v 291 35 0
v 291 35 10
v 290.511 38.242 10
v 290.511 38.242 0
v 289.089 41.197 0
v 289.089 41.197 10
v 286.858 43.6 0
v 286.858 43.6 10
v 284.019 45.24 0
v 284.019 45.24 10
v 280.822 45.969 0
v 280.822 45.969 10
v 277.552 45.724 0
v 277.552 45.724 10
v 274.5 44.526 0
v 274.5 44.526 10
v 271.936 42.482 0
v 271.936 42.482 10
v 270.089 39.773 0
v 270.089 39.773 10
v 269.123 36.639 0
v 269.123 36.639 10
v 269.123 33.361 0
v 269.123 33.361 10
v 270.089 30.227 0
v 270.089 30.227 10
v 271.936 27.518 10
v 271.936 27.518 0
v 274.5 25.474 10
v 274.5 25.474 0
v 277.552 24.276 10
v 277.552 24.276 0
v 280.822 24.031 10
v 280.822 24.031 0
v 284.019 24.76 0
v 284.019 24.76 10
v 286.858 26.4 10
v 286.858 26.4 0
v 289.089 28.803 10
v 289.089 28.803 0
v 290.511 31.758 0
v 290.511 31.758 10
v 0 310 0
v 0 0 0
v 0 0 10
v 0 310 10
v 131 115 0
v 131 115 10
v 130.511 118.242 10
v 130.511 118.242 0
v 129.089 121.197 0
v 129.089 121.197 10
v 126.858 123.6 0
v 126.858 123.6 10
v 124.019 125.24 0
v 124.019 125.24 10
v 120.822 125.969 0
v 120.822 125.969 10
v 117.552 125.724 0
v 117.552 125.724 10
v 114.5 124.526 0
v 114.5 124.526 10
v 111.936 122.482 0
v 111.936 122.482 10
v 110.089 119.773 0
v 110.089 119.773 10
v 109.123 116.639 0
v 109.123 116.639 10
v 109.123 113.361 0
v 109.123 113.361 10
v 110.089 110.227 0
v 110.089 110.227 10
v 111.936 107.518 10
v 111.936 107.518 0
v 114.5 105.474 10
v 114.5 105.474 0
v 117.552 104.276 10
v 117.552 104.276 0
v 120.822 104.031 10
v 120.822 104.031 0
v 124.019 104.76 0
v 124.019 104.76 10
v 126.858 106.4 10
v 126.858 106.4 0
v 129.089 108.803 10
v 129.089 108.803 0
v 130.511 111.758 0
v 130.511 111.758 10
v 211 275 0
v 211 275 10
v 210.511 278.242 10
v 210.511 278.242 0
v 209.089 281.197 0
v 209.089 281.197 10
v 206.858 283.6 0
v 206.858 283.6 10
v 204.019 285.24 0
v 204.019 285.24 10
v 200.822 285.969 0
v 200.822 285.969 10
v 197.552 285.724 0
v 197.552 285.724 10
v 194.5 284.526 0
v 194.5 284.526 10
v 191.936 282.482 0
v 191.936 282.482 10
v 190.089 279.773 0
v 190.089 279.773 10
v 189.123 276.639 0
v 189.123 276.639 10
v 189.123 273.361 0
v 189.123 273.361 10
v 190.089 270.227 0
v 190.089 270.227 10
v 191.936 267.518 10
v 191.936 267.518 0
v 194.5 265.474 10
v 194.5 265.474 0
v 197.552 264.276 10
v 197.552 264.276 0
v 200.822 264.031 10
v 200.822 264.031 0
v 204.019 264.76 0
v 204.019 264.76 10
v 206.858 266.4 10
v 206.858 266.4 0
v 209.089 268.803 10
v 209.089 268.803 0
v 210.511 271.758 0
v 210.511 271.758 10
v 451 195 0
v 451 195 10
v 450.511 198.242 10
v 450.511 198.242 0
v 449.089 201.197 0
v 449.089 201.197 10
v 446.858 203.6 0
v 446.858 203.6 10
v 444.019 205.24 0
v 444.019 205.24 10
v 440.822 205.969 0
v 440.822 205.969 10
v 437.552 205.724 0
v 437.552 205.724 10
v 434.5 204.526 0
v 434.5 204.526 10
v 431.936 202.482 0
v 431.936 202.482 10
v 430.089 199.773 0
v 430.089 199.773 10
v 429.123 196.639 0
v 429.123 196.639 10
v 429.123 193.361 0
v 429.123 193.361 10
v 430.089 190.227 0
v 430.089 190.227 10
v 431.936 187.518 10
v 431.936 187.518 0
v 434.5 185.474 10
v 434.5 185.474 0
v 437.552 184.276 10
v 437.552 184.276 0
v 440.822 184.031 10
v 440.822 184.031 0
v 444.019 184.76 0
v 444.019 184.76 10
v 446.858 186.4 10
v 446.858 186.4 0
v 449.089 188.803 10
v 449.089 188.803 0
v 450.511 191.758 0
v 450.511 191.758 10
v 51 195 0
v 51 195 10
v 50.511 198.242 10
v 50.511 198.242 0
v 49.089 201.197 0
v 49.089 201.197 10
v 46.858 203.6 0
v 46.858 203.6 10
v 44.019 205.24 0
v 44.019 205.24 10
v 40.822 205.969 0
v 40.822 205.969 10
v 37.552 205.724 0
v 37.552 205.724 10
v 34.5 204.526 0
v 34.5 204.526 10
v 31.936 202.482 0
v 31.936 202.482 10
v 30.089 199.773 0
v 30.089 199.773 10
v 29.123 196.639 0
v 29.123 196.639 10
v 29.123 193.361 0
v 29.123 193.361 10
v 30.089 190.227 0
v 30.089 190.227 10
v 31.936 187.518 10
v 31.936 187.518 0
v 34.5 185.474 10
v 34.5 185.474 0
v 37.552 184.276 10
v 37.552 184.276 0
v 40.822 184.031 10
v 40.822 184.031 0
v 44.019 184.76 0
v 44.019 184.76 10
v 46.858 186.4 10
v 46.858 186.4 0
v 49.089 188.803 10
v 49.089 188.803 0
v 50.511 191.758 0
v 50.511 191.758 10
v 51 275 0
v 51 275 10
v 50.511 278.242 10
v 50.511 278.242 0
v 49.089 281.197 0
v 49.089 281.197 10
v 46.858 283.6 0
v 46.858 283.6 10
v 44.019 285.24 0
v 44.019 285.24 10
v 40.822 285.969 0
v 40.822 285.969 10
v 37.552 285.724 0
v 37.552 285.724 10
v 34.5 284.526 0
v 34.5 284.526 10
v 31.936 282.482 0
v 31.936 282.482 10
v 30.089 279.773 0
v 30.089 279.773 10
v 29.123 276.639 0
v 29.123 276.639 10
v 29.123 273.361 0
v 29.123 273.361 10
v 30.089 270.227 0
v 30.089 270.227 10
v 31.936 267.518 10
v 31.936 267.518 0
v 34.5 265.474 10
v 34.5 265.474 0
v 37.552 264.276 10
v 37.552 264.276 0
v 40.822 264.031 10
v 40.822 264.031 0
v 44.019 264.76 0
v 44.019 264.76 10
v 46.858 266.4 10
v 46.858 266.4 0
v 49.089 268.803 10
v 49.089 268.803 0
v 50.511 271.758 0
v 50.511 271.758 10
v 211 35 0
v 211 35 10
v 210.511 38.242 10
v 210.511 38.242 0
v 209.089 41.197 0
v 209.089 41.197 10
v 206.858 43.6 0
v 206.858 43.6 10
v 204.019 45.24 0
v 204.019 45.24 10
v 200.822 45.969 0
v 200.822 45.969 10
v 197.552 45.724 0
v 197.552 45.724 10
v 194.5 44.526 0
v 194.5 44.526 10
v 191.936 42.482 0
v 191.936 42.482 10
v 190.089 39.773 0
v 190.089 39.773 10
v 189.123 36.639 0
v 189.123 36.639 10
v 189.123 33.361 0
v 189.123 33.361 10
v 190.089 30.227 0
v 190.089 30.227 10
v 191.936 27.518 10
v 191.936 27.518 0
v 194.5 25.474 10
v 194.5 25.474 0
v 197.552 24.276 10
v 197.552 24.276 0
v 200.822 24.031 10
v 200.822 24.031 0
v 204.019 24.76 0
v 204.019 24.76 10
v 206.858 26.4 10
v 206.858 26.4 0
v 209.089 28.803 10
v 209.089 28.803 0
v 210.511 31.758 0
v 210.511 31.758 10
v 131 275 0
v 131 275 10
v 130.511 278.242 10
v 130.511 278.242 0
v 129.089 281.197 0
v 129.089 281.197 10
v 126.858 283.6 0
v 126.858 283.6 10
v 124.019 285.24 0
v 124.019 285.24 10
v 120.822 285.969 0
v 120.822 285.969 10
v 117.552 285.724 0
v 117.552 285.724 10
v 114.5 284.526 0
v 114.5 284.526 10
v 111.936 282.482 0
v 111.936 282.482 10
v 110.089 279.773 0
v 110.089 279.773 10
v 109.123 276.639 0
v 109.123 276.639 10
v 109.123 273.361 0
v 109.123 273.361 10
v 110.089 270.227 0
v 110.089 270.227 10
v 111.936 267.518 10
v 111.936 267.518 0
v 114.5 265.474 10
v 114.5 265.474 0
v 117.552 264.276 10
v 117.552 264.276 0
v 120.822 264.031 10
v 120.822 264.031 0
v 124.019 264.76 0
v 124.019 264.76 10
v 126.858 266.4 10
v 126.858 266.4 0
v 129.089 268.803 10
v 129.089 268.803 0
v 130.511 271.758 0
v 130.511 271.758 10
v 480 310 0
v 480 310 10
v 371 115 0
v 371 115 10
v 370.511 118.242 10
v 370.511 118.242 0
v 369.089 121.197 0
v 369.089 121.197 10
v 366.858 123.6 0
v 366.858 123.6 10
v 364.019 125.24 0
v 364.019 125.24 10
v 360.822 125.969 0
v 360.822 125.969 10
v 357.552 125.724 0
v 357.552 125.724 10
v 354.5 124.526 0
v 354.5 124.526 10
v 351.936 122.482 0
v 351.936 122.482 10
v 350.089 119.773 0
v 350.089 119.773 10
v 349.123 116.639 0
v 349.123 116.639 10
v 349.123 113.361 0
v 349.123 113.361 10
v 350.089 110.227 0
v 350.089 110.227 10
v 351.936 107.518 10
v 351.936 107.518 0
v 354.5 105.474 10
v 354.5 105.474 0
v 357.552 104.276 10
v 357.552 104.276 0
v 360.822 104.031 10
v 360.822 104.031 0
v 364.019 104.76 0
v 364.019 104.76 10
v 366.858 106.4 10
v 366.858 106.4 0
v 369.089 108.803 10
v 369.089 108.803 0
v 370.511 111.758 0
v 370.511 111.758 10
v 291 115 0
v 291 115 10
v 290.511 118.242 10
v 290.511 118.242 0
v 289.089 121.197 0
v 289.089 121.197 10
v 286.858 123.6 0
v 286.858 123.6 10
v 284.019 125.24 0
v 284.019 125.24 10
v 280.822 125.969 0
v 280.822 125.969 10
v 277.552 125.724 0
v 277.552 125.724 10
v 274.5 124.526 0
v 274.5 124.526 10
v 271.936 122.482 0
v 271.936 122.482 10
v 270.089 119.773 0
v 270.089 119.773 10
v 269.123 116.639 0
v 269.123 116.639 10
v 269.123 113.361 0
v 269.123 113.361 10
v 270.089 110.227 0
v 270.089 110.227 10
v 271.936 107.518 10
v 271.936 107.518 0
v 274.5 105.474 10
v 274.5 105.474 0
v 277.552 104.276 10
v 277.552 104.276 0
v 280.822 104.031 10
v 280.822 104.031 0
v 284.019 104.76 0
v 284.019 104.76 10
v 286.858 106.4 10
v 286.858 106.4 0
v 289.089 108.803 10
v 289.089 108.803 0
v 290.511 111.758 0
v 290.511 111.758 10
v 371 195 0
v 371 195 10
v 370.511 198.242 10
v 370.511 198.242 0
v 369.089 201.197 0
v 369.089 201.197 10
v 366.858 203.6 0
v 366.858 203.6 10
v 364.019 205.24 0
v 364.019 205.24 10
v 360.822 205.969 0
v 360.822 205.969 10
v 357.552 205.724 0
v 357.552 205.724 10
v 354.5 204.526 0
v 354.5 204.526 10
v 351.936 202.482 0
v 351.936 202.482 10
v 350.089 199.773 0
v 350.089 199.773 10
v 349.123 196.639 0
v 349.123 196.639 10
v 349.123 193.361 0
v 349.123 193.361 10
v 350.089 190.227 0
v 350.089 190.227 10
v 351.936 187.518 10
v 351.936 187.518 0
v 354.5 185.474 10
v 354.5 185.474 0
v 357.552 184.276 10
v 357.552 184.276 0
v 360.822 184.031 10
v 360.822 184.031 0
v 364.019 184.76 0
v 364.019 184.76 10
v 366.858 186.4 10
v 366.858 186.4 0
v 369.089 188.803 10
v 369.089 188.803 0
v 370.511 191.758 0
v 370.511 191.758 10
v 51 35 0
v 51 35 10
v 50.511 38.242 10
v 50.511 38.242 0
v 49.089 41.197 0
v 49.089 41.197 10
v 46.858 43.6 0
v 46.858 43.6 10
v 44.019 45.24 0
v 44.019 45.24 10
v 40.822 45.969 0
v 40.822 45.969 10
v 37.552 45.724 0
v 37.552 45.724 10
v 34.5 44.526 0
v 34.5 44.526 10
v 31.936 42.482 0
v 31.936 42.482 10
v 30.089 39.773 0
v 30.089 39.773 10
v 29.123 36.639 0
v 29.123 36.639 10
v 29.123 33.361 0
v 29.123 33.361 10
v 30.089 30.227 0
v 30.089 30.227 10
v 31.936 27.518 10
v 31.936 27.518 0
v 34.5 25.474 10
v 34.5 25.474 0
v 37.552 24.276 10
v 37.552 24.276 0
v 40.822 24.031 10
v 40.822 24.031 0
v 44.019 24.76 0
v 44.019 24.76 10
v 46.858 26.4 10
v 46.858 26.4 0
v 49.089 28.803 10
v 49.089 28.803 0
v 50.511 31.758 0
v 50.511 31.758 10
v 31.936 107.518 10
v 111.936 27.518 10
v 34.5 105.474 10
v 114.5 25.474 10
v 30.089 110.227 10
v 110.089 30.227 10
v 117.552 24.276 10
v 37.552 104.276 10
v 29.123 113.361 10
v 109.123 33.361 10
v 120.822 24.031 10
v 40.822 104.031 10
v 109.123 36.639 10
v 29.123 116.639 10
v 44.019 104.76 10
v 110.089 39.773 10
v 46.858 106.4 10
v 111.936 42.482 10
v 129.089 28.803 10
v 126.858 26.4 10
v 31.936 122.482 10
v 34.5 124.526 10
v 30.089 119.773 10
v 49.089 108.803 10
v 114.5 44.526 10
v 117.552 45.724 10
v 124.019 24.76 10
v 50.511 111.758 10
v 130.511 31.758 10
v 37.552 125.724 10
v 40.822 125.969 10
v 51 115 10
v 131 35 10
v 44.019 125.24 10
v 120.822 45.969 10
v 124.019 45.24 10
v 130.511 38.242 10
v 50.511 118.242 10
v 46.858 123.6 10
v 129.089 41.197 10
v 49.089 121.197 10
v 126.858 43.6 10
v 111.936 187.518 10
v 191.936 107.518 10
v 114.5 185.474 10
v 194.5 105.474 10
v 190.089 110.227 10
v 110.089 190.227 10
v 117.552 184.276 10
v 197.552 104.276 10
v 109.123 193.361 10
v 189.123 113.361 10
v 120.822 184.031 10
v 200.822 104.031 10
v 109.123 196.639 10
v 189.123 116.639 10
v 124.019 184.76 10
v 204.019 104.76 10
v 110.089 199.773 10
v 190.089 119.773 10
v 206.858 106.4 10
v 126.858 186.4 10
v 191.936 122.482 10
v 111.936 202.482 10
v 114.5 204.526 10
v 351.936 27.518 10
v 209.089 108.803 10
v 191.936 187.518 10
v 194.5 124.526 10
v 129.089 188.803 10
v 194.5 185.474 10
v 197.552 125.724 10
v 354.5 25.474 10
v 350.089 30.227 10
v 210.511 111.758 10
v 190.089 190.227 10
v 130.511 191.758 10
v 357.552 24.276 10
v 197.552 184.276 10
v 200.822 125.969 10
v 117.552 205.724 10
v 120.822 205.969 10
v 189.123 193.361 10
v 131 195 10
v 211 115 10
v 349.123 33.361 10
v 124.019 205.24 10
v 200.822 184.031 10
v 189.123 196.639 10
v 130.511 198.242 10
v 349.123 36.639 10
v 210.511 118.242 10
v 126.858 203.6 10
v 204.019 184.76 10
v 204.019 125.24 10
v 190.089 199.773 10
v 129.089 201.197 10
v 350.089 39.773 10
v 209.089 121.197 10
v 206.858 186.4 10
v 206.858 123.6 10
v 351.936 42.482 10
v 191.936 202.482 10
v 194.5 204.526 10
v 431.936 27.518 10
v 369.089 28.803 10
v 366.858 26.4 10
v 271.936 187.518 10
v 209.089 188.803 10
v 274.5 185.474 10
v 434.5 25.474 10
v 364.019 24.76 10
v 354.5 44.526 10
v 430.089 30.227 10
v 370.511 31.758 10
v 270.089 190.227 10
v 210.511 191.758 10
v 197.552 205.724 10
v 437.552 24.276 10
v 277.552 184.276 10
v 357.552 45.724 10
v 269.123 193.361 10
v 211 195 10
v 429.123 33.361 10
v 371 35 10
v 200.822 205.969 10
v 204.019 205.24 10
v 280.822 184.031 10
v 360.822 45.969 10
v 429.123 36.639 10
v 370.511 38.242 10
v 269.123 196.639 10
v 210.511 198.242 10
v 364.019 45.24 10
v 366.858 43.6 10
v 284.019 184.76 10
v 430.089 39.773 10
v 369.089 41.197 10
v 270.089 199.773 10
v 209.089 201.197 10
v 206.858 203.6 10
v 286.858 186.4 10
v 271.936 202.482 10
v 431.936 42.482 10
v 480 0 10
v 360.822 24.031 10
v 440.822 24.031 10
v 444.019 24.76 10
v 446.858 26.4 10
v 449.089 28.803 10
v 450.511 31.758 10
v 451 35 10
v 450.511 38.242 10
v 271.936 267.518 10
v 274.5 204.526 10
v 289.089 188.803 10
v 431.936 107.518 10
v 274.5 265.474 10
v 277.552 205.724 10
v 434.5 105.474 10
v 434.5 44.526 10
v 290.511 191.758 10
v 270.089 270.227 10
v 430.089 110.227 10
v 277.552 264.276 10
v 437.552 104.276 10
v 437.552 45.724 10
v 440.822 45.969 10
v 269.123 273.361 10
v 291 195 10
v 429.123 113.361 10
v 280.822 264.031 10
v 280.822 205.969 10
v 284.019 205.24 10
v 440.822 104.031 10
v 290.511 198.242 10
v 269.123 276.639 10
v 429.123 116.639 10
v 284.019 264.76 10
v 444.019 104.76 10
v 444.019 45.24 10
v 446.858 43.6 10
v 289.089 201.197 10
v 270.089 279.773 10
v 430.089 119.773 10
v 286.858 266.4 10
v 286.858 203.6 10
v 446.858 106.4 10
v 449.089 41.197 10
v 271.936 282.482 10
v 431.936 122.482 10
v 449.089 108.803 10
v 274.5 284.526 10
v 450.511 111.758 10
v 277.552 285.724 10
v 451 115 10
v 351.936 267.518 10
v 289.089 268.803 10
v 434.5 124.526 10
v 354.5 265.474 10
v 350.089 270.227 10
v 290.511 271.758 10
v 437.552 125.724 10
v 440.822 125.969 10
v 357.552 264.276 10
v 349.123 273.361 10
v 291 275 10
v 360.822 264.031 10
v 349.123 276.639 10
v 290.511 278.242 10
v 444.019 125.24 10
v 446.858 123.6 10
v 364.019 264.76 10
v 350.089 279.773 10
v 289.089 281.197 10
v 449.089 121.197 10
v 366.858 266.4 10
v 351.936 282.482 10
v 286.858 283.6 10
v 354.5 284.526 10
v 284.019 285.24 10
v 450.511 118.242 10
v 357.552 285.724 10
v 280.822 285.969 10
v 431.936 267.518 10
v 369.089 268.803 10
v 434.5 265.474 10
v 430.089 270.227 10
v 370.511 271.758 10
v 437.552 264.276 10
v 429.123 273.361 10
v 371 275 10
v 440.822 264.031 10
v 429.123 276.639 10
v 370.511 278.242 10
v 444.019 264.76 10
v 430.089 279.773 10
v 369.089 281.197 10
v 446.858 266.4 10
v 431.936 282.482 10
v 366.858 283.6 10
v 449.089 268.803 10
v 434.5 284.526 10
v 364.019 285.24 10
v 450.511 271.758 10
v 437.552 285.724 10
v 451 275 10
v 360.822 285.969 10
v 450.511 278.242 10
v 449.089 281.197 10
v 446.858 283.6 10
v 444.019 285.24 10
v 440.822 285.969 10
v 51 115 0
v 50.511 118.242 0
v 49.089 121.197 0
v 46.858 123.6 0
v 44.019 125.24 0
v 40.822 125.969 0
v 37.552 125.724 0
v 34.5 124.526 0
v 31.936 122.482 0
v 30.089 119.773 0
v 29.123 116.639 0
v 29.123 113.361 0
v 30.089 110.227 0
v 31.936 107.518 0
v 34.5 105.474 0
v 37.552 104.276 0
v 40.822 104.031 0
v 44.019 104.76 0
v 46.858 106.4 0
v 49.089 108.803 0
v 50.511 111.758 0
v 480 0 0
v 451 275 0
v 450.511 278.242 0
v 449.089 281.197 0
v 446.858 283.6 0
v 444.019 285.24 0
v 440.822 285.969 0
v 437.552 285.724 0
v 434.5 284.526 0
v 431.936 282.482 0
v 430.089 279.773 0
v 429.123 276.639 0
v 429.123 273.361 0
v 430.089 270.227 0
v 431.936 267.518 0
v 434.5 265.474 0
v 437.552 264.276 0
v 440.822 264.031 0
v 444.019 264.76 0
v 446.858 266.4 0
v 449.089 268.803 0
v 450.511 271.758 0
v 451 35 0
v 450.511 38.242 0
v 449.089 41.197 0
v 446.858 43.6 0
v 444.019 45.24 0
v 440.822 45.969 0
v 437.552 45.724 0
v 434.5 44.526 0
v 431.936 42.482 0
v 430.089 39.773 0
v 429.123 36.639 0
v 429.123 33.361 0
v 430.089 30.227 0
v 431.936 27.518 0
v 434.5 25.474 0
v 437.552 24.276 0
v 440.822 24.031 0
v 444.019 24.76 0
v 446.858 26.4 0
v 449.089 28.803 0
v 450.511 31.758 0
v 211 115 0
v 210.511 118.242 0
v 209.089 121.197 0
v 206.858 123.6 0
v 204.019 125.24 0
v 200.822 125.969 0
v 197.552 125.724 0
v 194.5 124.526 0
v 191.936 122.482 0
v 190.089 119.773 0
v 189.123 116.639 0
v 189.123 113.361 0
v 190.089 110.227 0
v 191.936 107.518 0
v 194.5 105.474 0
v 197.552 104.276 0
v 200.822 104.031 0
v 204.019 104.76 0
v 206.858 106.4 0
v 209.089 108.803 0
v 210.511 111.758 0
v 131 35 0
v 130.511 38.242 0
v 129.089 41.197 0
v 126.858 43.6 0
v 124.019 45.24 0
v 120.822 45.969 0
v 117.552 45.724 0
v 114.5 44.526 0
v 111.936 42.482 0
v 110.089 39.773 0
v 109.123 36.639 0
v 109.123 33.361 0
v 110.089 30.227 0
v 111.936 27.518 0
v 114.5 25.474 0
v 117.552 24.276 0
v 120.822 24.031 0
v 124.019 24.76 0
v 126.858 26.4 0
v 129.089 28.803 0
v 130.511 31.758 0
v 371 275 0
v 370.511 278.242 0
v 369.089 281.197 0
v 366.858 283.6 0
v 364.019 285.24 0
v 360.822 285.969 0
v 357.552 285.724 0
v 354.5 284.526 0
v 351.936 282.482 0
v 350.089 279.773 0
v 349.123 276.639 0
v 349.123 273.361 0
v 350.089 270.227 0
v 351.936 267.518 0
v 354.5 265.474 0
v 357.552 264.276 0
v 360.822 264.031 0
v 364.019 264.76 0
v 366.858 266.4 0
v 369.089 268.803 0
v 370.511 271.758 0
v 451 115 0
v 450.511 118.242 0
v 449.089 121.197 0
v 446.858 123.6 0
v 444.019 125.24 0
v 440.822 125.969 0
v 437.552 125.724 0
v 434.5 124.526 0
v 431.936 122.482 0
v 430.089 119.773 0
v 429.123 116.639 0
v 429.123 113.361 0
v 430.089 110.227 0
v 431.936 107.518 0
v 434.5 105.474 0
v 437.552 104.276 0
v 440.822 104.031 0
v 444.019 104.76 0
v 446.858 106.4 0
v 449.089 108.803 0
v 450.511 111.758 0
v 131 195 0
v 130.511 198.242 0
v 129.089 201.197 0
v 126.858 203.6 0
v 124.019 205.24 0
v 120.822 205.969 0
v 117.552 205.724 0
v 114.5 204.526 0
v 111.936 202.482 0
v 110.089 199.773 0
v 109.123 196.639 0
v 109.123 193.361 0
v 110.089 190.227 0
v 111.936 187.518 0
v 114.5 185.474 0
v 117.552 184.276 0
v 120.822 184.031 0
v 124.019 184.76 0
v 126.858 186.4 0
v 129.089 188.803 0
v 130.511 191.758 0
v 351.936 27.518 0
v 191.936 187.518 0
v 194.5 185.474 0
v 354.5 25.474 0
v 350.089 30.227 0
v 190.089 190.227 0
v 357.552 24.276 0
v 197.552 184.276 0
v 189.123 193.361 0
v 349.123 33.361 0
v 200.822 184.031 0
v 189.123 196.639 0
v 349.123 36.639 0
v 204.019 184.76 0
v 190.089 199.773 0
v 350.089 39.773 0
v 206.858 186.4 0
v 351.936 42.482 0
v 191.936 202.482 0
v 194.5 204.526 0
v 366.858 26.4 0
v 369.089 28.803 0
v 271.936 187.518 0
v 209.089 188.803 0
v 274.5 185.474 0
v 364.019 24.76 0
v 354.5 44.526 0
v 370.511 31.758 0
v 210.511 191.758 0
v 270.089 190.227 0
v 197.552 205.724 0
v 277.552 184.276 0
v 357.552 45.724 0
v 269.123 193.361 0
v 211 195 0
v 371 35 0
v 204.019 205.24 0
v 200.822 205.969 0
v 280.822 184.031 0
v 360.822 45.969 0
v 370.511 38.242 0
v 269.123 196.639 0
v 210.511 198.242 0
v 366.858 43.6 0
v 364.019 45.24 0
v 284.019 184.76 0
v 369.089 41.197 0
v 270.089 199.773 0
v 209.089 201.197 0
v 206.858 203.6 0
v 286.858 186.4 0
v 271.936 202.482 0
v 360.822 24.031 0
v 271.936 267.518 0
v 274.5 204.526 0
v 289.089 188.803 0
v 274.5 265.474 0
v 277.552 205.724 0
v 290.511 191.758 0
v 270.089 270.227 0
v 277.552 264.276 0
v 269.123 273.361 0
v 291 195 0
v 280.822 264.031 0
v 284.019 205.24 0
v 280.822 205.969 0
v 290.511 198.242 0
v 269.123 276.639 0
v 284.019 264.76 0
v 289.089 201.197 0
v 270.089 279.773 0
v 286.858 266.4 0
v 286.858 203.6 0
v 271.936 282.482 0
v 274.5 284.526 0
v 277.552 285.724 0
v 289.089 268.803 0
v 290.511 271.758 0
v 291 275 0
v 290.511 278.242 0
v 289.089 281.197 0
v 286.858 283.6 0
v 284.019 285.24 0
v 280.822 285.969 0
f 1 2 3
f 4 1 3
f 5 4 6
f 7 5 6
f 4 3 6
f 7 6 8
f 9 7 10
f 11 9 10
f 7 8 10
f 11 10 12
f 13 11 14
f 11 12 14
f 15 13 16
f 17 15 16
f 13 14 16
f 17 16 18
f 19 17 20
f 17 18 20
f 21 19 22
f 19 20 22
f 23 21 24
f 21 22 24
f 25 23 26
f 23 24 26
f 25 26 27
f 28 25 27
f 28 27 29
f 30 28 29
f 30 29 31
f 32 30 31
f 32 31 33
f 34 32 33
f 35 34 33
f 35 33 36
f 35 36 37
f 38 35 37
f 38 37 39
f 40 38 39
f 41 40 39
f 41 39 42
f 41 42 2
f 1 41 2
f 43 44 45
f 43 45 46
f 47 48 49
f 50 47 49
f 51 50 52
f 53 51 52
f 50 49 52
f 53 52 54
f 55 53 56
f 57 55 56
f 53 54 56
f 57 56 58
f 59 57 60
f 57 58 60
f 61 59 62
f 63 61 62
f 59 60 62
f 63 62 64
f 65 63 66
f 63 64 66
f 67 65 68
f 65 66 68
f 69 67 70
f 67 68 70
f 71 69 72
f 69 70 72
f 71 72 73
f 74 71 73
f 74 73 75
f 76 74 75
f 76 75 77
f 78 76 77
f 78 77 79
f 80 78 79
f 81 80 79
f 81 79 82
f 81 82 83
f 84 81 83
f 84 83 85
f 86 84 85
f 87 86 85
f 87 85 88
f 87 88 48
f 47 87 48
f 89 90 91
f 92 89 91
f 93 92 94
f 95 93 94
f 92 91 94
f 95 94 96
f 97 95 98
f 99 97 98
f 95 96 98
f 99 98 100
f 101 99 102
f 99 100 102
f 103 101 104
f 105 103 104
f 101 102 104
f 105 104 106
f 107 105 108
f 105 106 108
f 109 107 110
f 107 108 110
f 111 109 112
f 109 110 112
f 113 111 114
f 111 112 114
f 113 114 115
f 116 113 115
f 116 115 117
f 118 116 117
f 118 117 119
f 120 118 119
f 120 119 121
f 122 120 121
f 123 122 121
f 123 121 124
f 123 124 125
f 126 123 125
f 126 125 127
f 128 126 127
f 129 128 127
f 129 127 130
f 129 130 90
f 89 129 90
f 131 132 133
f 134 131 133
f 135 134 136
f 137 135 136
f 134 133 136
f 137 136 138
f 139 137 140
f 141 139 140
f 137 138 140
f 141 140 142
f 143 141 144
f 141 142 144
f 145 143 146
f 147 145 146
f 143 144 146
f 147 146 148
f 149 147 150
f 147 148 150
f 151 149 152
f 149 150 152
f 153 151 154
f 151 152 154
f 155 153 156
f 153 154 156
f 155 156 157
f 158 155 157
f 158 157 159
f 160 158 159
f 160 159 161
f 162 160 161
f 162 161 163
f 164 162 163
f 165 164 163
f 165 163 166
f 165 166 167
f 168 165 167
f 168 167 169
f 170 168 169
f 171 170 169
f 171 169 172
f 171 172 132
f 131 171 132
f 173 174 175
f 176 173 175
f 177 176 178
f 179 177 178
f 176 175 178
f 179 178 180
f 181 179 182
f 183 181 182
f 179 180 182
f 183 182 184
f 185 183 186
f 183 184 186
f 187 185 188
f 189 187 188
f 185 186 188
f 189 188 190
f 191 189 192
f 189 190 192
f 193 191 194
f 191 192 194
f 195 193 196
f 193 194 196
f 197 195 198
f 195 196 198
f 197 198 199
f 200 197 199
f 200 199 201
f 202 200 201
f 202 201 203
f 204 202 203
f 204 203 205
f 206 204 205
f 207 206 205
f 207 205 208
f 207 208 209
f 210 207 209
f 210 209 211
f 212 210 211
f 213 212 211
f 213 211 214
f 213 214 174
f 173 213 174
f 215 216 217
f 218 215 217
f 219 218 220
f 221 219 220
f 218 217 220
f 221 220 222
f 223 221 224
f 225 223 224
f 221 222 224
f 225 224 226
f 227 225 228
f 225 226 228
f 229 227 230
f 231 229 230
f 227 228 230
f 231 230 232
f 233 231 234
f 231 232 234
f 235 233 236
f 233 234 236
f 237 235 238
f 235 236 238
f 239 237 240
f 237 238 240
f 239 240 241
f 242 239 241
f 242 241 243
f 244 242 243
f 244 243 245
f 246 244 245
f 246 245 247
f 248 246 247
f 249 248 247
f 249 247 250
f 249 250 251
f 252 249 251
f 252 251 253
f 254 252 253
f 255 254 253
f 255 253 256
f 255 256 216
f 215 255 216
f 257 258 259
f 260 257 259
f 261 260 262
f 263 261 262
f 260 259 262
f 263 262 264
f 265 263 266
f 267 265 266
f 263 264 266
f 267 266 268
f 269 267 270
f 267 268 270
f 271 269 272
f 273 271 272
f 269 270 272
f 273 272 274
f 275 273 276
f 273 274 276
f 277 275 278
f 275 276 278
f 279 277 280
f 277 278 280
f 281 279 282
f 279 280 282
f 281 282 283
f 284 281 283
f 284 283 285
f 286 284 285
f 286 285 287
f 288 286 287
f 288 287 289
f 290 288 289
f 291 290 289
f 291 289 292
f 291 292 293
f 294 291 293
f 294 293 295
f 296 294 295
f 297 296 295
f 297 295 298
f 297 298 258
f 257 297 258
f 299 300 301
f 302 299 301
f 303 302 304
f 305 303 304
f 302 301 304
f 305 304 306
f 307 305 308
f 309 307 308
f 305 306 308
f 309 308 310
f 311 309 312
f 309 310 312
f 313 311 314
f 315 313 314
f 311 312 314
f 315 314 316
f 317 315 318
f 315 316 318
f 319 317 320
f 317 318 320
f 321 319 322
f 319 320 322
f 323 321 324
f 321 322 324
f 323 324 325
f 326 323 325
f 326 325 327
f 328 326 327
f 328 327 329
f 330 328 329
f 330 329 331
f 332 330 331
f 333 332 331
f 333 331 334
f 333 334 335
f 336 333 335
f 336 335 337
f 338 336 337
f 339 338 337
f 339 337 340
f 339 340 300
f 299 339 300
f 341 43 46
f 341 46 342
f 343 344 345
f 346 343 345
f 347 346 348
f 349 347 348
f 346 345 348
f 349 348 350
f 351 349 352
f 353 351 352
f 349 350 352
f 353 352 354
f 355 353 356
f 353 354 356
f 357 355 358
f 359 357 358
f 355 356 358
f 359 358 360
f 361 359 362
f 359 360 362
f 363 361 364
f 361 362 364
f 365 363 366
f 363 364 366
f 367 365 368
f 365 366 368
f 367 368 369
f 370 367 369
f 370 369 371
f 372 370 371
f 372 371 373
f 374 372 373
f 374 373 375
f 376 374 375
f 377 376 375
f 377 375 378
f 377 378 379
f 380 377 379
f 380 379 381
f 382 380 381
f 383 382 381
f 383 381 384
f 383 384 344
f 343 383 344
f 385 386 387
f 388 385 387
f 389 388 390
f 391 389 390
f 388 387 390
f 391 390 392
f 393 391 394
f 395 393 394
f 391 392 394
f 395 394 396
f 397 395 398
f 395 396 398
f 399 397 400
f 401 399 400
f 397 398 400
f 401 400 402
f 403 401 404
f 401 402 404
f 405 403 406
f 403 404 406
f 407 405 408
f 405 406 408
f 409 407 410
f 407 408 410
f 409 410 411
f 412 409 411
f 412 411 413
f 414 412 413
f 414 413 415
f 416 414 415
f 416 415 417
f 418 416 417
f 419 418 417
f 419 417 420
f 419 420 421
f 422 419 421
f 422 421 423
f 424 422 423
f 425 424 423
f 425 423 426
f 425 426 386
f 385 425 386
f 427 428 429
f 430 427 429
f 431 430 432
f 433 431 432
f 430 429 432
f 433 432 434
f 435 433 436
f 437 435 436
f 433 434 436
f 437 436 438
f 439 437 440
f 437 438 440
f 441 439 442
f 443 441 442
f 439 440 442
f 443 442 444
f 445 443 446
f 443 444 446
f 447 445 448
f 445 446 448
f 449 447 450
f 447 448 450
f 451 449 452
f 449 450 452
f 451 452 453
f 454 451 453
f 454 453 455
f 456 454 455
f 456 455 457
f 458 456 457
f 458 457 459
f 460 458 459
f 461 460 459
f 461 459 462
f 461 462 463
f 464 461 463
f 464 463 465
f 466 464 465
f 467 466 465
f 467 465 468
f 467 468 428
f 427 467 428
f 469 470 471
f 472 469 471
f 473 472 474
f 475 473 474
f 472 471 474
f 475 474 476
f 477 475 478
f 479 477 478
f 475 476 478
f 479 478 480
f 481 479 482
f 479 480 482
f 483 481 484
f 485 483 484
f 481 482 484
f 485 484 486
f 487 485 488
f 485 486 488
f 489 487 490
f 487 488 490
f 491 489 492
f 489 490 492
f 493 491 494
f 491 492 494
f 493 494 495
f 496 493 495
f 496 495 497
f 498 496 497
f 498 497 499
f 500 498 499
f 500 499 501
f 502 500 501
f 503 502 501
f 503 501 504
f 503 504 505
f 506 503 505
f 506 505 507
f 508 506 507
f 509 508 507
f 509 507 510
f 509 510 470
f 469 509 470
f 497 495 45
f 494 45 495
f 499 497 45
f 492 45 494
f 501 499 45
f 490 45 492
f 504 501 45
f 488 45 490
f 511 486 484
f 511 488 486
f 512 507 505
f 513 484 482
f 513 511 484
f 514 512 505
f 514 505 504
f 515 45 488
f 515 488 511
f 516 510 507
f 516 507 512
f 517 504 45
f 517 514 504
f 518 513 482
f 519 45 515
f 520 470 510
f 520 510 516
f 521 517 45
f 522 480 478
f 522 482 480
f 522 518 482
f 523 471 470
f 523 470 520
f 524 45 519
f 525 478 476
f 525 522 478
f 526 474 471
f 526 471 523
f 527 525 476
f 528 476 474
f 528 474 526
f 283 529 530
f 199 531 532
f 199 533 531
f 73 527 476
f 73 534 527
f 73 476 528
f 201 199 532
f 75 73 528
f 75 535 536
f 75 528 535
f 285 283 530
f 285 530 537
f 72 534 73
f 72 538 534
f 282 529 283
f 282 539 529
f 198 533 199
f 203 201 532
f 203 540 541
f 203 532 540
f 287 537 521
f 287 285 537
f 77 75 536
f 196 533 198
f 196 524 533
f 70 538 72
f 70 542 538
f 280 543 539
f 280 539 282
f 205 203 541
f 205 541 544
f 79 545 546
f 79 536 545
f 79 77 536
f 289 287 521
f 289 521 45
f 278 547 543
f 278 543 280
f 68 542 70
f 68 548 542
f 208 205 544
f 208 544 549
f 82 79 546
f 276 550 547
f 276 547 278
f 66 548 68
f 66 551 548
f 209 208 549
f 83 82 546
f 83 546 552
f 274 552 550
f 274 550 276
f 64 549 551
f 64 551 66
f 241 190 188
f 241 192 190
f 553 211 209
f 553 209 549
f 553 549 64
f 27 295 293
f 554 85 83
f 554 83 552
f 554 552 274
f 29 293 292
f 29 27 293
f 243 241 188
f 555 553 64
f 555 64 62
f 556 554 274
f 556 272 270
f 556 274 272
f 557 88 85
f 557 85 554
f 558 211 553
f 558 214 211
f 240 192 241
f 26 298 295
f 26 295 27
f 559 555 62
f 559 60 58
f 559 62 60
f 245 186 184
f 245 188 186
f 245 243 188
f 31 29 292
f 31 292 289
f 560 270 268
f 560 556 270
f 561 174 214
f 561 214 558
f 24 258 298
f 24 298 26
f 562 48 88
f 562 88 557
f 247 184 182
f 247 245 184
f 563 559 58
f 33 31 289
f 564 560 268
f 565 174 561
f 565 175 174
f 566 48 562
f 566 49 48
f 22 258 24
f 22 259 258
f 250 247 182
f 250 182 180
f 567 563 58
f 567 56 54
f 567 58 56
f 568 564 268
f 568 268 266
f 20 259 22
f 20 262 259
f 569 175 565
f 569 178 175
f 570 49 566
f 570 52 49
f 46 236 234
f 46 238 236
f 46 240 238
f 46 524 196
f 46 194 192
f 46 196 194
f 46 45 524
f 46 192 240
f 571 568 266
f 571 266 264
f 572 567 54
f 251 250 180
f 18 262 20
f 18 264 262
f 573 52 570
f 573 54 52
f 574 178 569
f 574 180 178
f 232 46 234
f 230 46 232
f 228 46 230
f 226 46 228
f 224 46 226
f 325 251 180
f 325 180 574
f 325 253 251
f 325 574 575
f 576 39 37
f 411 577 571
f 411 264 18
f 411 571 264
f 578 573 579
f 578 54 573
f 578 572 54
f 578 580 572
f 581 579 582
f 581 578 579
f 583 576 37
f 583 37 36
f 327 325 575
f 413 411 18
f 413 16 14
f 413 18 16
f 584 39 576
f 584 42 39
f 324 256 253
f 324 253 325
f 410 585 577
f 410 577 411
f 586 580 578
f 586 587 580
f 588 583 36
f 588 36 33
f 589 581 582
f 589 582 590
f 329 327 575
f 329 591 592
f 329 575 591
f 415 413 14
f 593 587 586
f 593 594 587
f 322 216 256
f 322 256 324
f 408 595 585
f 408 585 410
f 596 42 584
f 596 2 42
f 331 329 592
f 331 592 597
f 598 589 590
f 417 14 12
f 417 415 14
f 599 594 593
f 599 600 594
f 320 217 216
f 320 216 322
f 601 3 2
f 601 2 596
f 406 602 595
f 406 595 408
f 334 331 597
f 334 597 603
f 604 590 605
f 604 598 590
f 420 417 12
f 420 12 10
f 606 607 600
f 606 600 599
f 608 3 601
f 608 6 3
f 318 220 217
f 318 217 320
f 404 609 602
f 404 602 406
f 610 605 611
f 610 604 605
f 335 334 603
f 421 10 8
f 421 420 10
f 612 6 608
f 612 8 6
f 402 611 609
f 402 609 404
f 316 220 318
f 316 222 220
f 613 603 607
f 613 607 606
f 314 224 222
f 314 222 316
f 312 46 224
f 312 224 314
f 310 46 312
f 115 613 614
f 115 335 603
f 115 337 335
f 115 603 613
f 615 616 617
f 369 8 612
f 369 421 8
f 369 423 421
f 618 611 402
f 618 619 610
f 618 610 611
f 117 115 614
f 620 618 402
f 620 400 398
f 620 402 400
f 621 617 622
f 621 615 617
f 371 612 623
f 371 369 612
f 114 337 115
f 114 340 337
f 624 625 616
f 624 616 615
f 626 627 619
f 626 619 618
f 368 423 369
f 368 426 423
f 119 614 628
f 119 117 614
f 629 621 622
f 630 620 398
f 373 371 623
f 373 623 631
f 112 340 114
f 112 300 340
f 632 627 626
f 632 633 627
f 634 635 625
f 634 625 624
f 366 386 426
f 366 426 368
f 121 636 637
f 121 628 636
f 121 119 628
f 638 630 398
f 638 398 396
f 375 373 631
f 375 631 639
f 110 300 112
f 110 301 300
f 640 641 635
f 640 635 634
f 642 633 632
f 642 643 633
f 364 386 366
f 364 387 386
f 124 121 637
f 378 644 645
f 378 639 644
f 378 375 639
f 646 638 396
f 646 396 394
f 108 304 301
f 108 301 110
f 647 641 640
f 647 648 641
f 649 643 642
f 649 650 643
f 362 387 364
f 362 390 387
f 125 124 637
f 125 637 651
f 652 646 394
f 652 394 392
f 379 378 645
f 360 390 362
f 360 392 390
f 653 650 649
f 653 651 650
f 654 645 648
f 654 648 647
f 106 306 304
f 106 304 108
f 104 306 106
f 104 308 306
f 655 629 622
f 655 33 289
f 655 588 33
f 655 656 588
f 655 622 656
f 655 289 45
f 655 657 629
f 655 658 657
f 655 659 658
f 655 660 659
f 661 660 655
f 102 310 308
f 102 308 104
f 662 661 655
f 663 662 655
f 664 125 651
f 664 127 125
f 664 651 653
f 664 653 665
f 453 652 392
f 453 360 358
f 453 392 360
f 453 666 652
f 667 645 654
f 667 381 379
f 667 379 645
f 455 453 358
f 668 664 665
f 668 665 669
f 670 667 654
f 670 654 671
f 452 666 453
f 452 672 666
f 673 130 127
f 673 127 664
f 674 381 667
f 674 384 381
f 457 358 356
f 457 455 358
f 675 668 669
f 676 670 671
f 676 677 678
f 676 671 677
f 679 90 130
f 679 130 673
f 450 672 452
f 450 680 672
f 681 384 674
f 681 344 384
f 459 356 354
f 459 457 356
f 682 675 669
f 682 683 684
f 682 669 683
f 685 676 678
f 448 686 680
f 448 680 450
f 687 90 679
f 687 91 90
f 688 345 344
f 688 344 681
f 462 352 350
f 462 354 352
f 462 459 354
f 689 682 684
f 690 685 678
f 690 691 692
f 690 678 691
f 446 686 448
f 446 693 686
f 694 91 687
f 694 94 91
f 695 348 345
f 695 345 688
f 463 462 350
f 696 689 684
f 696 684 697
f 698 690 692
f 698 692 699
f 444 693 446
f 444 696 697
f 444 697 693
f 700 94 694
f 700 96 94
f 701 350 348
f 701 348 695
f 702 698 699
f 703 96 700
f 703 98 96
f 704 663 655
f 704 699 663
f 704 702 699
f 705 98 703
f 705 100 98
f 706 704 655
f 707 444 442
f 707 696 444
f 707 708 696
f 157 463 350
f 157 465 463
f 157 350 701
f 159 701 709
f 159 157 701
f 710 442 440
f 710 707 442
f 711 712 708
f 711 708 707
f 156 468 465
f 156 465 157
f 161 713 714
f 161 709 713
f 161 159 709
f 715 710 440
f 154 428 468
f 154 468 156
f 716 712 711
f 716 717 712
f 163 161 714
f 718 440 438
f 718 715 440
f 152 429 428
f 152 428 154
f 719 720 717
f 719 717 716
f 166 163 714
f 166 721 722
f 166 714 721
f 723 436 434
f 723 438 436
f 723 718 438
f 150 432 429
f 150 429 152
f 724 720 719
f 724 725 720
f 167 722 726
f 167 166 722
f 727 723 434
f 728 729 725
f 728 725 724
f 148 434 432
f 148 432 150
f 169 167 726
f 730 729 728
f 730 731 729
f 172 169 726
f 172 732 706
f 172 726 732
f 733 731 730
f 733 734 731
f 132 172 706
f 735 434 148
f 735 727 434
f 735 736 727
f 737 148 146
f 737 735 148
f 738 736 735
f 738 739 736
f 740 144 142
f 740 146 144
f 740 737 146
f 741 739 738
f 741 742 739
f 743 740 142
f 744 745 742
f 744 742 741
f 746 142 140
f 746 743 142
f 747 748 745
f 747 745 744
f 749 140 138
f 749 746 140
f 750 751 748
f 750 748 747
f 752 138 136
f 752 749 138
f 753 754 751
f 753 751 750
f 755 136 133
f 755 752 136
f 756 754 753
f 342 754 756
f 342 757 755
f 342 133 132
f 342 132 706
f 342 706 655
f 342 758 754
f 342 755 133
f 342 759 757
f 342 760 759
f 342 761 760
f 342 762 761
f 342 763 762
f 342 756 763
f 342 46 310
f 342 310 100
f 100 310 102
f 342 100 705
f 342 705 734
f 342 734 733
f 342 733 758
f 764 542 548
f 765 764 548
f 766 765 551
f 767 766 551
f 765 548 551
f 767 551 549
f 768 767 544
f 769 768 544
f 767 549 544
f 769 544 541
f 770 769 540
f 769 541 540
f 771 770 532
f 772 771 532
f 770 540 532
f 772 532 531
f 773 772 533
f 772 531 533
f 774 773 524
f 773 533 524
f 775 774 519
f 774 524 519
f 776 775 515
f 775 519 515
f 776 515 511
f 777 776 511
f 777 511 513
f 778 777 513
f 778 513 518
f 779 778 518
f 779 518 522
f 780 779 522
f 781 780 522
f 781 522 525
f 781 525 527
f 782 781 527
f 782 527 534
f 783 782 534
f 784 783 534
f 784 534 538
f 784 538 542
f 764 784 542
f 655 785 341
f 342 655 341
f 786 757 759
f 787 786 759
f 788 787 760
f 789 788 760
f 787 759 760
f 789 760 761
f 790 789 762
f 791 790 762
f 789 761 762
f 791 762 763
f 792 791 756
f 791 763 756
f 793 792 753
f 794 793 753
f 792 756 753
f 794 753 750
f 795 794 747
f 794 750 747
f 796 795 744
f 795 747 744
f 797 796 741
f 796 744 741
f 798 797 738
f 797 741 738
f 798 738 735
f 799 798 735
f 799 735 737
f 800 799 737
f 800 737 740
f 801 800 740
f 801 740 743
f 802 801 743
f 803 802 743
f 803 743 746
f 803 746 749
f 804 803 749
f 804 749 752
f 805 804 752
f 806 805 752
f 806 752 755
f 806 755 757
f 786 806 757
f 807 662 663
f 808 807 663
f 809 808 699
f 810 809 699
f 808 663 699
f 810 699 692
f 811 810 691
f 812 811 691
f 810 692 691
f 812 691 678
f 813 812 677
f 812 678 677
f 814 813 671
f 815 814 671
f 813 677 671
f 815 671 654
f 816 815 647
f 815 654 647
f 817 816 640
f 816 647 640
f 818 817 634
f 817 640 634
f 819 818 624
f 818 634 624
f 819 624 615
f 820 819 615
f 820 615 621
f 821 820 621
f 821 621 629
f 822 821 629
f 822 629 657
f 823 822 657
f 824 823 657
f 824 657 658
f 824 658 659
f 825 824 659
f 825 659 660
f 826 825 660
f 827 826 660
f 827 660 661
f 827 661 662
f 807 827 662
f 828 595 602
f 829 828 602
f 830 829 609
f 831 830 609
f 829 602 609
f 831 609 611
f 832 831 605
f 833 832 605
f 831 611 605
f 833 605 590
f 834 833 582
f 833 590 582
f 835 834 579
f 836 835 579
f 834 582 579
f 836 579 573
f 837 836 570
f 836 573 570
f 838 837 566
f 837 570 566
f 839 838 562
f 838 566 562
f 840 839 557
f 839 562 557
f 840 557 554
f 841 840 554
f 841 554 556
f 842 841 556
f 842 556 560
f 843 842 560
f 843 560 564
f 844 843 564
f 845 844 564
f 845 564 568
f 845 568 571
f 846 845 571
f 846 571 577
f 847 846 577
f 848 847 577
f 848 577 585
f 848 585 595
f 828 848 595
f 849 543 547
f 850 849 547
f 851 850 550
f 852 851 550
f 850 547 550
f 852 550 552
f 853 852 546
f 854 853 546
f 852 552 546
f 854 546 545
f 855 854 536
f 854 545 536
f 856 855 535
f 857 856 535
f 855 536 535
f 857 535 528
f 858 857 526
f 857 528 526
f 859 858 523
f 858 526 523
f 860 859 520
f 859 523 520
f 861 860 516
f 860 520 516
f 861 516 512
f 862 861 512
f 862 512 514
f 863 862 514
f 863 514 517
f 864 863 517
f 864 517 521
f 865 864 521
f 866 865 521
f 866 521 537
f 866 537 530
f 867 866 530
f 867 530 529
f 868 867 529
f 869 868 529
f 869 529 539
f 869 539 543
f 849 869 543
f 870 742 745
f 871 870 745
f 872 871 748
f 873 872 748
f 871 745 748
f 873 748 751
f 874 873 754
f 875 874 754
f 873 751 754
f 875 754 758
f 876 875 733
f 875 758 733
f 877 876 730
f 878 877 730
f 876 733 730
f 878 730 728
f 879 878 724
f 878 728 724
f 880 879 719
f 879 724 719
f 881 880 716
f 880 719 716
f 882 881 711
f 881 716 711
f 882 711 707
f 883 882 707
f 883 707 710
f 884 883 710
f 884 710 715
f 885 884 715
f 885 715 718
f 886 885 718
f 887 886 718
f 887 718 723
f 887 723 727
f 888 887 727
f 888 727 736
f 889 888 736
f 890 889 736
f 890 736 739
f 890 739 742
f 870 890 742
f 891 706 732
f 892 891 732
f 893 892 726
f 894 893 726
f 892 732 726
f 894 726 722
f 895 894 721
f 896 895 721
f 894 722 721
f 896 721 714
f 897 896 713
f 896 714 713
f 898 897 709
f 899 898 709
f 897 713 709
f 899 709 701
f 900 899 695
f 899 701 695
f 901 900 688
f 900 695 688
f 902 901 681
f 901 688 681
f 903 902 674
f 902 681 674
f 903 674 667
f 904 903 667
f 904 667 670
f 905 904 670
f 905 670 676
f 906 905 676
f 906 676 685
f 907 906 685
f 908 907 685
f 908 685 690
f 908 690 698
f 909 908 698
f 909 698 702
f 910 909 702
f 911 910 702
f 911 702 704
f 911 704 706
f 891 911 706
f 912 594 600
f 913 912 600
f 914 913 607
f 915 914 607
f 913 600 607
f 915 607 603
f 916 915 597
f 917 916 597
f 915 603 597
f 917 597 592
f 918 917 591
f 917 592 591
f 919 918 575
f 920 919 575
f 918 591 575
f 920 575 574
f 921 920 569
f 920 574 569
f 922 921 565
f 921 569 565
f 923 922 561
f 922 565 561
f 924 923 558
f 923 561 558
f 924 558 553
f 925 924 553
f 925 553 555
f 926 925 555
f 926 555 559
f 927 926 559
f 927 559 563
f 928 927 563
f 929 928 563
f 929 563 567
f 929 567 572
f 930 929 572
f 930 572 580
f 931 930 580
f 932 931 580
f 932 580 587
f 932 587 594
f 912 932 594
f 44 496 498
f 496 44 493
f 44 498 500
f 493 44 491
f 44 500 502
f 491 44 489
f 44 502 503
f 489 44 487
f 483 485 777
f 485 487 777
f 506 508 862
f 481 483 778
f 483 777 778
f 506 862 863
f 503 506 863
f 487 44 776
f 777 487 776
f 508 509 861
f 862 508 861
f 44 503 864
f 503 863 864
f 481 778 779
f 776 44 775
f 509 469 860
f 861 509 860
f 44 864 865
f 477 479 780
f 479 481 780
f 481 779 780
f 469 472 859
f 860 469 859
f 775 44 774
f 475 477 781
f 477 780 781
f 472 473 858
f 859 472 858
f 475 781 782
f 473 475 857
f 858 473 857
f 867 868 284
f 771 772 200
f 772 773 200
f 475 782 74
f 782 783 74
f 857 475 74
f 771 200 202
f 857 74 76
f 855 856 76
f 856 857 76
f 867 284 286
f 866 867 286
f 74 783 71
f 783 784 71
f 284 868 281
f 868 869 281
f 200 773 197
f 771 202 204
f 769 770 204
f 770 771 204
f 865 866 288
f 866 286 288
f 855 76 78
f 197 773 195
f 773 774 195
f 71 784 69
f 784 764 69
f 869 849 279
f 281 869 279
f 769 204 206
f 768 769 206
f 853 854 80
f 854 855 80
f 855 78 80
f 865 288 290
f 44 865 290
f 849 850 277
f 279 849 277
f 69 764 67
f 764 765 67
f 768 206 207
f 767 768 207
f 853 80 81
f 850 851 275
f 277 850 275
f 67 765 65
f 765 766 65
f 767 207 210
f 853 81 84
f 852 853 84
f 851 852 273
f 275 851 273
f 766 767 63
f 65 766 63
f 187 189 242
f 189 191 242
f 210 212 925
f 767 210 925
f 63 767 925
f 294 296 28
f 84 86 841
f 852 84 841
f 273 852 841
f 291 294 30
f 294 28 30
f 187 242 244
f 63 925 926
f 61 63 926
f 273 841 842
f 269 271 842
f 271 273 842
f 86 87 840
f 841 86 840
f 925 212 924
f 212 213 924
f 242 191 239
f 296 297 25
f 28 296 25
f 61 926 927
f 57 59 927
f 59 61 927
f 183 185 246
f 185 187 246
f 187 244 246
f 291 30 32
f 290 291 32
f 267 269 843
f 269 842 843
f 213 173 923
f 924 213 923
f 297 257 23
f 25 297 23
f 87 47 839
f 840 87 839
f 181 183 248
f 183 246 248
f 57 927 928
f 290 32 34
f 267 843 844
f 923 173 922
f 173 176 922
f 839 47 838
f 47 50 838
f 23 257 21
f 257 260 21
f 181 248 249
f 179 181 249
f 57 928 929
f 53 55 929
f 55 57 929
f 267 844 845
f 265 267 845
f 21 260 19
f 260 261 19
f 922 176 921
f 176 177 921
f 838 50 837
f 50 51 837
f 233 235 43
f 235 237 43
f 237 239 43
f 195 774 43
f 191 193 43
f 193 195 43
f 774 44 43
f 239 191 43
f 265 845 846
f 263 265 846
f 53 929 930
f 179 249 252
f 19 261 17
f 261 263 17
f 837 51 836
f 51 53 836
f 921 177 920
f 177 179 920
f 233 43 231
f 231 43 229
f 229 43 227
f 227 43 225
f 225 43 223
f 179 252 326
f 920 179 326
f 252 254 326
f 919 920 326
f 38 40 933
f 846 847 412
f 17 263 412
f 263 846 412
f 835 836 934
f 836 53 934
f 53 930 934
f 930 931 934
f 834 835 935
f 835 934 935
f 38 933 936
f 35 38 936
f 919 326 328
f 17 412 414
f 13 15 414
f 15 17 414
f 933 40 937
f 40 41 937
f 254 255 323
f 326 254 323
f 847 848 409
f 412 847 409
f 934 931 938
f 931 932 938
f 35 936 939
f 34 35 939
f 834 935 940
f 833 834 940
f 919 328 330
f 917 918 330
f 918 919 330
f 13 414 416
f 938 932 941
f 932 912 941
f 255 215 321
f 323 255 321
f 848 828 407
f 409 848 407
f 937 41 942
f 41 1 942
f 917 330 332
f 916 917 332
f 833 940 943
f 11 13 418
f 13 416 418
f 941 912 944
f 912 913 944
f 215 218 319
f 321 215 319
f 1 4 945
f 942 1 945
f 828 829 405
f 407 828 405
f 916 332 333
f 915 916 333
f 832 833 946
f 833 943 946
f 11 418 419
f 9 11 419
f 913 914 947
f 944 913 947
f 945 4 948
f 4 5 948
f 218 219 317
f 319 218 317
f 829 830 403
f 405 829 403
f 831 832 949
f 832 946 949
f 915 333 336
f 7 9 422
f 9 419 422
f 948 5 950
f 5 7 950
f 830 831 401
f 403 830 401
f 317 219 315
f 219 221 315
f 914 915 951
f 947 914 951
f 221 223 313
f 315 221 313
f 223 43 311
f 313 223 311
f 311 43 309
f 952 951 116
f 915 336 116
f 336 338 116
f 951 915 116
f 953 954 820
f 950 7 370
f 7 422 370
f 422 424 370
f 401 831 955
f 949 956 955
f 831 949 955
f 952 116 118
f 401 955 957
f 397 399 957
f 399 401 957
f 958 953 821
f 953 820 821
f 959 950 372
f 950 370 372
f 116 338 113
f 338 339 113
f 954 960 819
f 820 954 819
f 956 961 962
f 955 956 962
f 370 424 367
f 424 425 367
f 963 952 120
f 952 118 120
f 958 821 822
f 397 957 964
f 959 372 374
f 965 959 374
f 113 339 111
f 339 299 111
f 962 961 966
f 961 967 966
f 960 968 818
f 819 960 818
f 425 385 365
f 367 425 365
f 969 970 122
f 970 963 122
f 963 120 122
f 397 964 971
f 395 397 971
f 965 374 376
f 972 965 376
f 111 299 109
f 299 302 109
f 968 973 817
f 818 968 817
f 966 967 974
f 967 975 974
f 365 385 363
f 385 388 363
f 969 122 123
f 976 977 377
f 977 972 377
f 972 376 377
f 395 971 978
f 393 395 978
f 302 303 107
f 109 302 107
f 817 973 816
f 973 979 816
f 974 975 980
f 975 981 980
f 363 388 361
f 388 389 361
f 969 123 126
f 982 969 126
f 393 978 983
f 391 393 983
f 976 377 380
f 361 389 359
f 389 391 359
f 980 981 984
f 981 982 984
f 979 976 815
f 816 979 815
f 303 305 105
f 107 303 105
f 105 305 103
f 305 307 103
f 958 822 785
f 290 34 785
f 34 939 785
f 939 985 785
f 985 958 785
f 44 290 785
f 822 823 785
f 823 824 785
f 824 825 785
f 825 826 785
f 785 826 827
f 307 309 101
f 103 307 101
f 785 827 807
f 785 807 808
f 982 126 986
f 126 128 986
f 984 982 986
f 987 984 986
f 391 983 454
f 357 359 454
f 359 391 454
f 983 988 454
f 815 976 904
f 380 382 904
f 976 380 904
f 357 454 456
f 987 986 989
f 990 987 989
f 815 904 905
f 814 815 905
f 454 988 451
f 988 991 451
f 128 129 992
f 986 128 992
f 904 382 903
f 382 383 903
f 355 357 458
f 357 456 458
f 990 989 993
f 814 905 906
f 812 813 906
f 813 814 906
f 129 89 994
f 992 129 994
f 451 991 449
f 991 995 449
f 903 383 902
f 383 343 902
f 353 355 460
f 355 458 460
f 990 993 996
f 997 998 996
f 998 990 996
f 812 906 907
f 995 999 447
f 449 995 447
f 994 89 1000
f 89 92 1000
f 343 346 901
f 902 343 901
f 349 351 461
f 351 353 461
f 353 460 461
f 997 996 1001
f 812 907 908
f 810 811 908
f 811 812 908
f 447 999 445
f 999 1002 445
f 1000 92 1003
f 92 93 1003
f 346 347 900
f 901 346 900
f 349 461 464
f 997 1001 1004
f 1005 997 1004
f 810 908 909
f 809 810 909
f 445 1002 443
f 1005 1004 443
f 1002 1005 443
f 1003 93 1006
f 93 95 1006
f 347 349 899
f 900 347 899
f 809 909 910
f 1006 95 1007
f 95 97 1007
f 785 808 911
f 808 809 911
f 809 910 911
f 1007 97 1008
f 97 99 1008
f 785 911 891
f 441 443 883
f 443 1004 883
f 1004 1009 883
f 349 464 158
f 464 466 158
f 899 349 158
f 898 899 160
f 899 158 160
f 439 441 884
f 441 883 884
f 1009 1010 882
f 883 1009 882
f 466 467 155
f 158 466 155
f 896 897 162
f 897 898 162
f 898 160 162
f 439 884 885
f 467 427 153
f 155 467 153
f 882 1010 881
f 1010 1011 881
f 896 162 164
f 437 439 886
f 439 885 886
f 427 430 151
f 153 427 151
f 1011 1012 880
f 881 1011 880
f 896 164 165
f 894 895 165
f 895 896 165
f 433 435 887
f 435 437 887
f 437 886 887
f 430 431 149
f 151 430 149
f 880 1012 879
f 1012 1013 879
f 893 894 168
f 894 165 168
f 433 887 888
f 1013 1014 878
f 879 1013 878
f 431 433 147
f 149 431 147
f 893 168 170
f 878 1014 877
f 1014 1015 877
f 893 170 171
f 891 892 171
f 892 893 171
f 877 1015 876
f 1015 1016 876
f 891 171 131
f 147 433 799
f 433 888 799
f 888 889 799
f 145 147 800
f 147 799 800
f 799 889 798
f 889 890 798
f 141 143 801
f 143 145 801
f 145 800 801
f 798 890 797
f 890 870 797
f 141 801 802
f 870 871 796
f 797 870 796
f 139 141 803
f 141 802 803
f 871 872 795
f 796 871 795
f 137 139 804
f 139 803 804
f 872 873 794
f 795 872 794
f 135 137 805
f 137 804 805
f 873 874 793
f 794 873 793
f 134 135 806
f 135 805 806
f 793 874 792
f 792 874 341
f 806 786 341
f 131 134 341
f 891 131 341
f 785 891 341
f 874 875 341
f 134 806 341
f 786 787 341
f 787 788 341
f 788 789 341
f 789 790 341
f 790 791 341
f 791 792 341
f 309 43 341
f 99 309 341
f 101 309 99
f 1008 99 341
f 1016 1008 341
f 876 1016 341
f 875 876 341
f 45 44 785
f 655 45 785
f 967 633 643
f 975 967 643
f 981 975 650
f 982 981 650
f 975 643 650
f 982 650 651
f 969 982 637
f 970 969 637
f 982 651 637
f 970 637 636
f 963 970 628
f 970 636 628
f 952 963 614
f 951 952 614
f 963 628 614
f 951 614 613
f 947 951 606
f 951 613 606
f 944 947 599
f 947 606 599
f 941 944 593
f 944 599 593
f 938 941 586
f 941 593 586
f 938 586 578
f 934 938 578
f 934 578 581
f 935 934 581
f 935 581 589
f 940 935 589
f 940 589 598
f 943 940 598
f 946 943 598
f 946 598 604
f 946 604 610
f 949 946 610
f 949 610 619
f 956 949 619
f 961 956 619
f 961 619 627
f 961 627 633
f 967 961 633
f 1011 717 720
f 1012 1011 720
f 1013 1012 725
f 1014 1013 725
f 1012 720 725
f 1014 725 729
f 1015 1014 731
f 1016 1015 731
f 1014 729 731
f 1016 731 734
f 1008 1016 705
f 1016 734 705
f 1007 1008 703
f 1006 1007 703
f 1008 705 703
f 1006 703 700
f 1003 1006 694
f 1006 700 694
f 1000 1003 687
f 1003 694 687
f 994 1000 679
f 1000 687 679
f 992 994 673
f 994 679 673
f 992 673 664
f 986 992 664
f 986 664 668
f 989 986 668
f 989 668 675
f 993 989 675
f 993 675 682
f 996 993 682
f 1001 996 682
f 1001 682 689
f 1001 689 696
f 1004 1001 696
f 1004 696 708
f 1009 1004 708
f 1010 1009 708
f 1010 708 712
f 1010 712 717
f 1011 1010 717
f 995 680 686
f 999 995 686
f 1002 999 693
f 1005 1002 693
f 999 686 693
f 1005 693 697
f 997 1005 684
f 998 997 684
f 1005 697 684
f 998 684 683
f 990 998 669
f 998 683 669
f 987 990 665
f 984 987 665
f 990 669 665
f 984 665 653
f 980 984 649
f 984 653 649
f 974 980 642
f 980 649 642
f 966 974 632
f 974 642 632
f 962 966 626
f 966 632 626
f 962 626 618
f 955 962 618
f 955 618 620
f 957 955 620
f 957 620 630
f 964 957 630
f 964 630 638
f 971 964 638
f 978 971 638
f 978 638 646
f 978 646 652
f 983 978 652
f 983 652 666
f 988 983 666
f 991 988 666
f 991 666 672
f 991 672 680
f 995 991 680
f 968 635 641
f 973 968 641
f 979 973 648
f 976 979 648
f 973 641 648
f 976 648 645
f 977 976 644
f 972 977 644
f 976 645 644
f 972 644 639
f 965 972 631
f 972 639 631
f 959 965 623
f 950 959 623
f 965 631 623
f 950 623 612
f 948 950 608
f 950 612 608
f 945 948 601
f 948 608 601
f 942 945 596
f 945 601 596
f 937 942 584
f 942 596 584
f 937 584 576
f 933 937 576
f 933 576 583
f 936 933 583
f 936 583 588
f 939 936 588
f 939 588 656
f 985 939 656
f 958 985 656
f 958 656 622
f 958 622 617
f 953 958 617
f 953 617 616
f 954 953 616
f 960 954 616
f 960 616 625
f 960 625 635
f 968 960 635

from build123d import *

# Parameters (mm, degrees)
SKETCH_1_W                  = 480
SKETCH_1_H                  = 310
EXTRUDE_1_DEPTH             = 10
SKETCH_2_R                  = 11
CUT_EXTRUDE_1_DEPTH         = 572.489282489
PATTERN_LINEAR_1_COUNT      = 6
PATTERN_LINEAR_1_PITCH      = 80
PATTERN_LINEAR_1_COUNT_DIR2 = 4
PATTERN_LINEAR_1_PITCH_DIR2 = 80


with BuildPart() as part:
    # 草图1 → 拉伸1 (new body)
    with BuildSketch(Plane.XY):
        with Locations((240, 155)):
            Rectangle(SKETCH_1_W, SKETCH_1_H)
    extrude(amount=EXTRUDE_1_DEPTH)

    # 草图2 → 切除-拉伸1 (cut, through all)
    with BuildSketch(Plane.XY.offset(10)):
        with Locations((40, 35)):
            Circle(SKETCH_2_R)
    cut_extrude_1 = extrude(amount=-CUT_EXTRUDE_1_DEPTH, mode=Mode.SUBTRACT)

    # 阵列(线性)1: Cut-Extrude 1 6 × 4
    with Locations(*[(i * PATTERN_LINEAR_1_PITCH, j * PATTERN_LINEAR_1_PITCH_DIR2, 0) for i in range(PATTERN_LINEAR_1_COUNT) for j in range(PATTERN_LINEAR_1_COUNT_DIR2) if (i, j) != (0, 0)]):
        add(cut_extrude_1, mode=Mode.SUBTRACT)


solid = part.part
